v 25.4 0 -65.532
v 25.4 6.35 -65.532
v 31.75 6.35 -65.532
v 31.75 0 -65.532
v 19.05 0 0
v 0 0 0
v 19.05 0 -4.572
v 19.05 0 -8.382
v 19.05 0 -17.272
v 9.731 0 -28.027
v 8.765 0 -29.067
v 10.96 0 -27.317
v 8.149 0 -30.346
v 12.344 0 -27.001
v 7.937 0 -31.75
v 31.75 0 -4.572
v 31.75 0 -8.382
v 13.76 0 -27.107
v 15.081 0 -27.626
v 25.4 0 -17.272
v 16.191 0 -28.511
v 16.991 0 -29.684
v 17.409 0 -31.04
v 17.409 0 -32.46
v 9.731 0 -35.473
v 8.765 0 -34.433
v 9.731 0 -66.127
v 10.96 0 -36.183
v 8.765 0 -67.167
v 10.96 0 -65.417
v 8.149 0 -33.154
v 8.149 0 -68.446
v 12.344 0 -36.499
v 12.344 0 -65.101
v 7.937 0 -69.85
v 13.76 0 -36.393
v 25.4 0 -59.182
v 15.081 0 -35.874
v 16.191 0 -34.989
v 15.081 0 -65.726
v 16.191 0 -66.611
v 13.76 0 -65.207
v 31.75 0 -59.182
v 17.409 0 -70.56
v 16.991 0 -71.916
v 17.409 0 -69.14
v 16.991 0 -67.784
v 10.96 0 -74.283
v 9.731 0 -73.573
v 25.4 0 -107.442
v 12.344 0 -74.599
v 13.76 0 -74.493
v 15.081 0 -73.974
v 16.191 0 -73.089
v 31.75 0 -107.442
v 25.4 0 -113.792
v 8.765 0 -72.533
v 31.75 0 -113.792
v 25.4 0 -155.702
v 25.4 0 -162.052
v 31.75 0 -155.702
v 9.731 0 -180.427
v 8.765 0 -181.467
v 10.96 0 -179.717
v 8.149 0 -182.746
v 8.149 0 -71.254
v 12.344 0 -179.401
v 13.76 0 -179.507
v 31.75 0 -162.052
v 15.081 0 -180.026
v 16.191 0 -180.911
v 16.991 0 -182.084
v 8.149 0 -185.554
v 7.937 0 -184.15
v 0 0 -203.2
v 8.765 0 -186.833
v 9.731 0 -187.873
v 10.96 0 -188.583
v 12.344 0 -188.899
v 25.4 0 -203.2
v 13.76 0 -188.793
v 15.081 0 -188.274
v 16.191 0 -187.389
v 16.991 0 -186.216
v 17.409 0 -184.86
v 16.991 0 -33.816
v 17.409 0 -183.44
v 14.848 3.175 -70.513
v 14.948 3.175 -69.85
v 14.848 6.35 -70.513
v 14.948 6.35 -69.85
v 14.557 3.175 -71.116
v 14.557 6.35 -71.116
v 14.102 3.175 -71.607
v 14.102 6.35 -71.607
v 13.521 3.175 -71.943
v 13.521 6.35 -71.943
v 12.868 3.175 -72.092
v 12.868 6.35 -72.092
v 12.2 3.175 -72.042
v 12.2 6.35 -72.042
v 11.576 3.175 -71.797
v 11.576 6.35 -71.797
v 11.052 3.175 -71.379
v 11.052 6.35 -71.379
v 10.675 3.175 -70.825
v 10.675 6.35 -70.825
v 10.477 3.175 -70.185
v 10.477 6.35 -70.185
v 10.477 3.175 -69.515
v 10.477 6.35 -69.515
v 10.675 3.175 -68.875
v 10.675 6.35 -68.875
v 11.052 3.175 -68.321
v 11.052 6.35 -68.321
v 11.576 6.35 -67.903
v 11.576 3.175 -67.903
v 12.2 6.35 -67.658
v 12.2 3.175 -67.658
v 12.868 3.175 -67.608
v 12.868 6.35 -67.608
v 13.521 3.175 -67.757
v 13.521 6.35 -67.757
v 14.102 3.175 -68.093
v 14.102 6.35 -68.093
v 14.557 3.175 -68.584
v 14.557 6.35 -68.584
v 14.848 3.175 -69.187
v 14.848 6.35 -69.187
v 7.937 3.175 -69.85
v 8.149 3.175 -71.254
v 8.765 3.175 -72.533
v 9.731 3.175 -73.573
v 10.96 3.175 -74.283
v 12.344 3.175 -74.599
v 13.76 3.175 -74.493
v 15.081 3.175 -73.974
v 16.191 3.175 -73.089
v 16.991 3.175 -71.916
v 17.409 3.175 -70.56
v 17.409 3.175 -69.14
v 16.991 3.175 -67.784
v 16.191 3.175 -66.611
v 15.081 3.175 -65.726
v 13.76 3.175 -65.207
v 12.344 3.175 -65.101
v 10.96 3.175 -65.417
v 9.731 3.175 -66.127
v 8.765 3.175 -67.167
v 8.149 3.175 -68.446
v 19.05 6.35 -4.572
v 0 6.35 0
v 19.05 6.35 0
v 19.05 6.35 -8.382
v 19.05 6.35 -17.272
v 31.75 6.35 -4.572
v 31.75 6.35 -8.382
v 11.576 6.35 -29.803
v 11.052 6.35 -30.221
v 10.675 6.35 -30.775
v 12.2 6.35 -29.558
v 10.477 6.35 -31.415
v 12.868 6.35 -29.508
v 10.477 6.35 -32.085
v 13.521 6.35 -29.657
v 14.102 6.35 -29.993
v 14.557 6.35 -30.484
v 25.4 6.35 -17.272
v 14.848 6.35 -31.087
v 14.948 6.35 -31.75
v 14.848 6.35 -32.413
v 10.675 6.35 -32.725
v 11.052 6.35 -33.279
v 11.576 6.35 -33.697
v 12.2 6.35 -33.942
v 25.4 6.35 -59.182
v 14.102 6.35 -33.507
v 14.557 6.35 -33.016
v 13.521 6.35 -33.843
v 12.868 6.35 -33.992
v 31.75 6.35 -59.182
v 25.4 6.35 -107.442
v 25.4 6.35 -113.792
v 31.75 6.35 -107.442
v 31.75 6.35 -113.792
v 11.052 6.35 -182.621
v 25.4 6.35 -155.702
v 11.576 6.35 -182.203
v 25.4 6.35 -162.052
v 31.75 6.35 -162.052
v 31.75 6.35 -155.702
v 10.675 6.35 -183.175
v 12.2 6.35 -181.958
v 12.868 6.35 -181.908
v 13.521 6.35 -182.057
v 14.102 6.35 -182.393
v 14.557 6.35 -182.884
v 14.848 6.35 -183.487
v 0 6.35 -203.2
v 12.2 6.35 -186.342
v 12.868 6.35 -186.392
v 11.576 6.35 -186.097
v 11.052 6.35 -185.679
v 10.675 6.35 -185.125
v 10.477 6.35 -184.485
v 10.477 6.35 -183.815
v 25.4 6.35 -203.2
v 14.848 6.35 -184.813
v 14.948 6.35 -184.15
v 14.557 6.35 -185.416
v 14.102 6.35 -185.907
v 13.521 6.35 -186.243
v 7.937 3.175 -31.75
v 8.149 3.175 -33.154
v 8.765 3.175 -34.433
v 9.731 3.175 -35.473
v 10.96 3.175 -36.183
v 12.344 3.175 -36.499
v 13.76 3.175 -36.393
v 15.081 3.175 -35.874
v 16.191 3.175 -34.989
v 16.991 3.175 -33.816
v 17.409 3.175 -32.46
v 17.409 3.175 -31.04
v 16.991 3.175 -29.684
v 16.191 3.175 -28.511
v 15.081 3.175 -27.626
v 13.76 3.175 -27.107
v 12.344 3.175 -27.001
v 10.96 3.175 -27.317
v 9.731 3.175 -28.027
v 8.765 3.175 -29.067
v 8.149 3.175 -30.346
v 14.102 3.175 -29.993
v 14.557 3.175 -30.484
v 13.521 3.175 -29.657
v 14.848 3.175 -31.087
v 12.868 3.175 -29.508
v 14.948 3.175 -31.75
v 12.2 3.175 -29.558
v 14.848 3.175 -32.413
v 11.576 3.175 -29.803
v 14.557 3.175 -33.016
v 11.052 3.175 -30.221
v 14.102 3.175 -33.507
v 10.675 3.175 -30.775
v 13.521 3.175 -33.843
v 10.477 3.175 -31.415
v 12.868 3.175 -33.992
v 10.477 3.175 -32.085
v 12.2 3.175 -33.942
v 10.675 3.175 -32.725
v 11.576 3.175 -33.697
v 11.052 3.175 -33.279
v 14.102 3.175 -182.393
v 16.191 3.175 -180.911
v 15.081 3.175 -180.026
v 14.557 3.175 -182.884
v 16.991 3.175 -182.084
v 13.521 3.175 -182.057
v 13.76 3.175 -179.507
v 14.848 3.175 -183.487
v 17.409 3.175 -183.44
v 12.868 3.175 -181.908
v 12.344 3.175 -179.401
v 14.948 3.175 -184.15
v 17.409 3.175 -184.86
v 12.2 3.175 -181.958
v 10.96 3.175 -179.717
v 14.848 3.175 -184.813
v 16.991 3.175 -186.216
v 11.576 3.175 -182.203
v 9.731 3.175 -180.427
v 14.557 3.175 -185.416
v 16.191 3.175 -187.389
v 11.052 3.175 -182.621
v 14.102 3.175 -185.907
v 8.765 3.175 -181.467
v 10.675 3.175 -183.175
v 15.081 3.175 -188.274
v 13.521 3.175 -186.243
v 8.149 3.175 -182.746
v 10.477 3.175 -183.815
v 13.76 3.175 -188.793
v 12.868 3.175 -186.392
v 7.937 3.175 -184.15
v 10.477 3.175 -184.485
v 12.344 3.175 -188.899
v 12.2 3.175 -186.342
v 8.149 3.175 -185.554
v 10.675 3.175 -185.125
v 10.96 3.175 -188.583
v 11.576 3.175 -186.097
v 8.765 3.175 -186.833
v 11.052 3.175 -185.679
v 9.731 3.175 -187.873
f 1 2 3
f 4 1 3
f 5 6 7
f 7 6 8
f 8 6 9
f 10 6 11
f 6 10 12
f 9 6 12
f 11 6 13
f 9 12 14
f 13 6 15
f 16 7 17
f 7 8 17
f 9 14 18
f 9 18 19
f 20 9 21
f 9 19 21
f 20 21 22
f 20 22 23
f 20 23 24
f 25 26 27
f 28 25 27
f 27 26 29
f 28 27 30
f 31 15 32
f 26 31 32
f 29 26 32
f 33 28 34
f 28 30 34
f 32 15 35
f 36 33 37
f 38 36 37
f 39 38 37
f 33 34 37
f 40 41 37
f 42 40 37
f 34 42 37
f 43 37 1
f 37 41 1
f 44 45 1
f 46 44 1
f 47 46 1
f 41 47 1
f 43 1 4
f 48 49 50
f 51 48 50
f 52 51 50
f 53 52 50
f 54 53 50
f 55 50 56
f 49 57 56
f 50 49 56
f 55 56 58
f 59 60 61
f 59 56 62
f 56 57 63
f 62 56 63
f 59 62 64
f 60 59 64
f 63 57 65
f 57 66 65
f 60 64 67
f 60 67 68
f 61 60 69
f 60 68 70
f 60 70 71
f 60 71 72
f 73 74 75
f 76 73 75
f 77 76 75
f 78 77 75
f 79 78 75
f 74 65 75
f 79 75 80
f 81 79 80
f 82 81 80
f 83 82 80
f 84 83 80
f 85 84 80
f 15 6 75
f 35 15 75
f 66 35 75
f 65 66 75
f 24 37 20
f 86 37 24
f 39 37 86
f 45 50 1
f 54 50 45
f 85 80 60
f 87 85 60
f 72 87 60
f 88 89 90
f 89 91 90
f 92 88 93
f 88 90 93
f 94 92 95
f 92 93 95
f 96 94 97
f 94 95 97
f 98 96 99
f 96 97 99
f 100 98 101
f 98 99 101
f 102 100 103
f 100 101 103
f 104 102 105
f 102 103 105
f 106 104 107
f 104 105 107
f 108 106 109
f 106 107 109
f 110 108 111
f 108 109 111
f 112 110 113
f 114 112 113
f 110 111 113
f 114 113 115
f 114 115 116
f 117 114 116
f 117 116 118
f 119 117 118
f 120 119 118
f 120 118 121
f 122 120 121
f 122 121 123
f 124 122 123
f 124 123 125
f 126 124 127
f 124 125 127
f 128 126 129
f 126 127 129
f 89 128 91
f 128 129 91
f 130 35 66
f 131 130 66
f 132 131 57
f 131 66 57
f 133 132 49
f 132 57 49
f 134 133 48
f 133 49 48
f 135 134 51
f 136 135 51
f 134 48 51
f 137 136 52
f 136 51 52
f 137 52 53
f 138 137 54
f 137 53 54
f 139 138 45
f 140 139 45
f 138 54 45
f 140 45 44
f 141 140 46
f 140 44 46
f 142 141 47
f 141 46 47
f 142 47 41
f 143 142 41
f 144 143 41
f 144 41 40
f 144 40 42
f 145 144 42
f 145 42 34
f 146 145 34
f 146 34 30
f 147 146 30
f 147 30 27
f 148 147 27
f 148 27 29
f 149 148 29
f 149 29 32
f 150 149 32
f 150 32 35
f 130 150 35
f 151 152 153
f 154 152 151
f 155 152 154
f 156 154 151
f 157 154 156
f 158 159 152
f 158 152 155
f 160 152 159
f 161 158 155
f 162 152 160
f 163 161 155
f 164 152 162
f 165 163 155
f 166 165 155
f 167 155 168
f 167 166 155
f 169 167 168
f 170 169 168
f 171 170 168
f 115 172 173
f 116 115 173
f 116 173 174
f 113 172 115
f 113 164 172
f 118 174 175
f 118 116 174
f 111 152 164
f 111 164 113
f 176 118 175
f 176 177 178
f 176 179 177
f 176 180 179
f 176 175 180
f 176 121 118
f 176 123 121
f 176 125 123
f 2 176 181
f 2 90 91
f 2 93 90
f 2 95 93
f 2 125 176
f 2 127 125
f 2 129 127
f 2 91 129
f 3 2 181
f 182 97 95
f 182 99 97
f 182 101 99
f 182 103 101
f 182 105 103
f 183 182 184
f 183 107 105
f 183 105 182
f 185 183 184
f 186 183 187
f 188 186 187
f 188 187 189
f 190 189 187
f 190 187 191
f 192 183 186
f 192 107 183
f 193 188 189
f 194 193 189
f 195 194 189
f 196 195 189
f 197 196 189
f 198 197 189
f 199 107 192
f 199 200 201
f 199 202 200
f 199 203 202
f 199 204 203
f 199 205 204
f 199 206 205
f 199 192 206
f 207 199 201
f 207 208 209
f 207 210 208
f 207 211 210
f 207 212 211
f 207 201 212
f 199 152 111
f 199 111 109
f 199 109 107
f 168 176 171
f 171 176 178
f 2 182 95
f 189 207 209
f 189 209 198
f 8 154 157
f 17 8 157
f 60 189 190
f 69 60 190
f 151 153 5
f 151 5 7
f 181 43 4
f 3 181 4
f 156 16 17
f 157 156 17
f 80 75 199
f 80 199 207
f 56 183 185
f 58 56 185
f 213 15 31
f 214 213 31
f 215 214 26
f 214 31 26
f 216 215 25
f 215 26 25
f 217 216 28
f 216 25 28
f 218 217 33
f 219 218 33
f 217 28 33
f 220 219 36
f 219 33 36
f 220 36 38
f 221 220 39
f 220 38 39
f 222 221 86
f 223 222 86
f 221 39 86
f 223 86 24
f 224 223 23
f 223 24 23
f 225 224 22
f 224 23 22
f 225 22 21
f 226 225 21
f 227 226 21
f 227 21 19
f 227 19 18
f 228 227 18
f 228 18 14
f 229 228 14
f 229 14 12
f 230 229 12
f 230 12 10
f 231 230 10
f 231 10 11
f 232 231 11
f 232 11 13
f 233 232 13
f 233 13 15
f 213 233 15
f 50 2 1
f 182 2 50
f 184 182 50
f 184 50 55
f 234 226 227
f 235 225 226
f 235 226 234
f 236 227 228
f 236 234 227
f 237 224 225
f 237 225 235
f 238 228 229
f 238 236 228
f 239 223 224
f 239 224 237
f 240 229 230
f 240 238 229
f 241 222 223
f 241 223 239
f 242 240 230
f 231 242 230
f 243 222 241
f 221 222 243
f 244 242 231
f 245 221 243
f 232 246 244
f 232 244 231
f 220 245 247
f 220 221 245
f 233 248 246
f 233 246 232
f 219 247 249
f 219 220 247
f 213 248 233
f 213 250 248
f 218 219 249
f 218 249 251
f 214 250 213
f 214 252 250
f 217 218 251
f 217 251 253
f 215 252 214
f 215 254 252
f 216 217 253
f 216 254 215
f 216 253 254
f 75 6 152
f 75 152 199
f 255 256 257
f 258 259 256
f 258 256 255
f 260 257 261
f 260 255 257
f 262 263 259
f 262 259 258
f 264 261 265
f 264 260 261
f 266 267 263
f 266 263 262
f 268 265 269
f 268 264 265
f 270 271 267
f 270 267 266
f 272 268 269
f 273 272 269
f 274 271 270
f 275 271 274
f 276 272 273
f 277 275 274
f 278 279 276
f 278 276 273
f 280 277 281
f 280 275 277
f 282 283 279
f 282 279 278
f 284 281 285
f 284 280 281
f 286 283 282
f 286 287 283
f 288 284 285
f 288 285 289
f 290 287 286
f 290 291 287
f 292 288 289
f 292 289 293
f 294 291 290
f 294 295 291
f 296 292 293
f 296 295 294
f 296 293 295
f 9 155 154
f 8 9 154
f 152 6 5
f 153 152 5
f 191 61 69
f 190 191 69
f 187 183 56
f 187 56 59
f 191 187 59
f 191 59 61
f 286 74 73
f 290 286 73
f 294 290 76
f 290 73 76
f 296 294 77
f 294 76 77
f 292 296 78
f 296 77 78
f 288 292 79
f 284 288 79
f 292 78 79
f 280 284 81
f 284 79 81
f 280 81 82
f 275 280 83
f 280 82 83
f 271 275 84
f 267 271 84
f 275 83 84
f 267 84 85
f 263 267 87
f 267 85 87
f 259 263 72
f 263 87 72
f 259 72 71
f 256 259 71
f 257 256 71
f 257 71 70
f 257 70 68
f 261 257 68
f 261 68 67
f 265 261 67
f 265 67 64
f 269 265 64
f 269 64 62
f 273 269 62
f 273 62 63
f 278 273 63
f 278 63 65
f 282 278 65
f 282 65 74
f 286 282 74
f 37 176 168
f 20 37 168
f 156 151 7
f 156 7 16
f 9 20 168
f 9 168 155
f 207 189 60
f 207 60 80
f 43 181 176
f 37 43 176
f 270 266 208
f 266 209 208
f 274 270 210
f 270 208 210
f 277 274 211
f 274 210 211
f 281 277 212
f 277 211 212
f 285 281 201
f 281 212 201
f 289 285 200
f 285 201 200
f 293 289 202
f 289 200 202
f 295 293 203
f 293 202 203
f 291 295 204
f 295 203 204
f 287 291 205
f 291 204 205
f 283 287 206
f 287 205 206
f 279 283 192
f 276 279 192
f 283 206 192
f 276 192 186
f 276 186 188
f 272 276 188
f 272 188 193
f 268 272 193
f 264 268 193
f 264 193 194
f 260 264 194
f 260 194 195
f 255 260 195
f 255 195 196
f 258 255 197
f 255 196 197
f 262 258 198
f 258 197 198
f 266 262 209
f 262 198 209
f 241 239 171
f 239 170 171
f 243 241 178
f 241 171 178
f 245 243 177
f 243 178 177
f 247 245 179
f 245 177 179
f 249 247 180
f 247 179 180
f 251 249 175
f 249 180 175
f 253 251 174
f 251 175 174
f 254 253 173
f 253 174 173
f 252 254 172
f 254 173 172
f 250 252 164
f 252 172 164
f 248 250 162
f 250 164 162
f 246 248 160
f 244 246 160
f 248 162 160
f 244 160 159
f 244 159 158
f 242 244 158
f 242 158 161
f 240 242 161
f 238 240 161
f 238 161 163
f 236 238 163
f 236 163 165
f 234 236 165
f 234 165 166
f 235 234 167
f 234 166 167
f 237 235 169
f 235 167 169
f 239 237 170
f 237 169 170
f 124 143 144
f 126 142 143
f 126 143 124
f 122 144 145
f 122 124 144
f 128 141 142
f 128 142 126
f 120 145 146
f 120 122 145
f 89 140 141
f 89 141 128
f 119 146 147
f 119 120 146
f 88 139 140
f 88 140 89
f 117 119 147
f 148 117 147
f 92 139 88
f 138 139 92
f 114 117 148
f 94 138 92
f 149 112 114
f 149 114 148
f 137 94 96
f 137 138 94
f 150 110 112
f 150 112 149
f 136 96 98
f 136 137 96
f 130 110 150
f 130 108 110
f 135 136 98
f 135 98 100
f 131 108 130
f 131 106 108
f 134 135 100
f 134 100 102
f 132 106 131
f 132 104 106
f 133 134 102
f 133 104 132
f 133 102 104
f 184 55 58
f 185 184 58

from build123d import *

# Parameters (mm, degrees)
SKETCH1_W                                           = 31.75
SKETCH1_H                                           = 203.2
BOSS_EXTRUDE1_DEPTH                                 = 6.35
SKETCH2_W                                           = 6.35
SKETCH2_H                                           = 41.148
SKETCH2_H_2                                         = 41.91
SKETCH2_W_2                                         = 12.7
SKETCH2_H_3                                         = 4.572
CUT_EXTRUDE1_DEPTH                                  = 7.35
CBORE_FOR_8_BINDING_HEAD_MACHINE_SCREW1_D           = 4.4958
CBORE_FOR_8_BINDING_HEAD_MACHINE_SCREW1_CBORE_D     = 9.525
CBORE_FOR_8_BINDING_HEAD_MACHINE_SCREW1_CBORE_DEPTH = 3.175


with BuildPart() as part:
    # Sketch1 → Boss-Extrude1 (new body)
    with BuildSketch(Plane(origin=(0, 0, 0), x_dir=(1, 0, 0), z_dir=(0, 1, 0))):
        with Locations((15.875, 101.6)):
            Rectangle(SKETCH1_W, SKETCH1_H)
    extrude(amount=BOSS_EXTRUDE1_DEPTH)

    # Sketch2 → Cut-Extrude1 (cut, through all)
    with BuildSketch(Plane(origin=(0, 6.35, 0), x_dir=(1, 0, 0), z_dir=(0, 1, 0))):
        with Locations((28.575, 182.626)):
            Rectangle(SKETCH2_W, SKETCH2_H)
        with Locations((28.575, 134.747)):
            Rectangle(SKETCH2_W, SKETCH2_H_2)
        Polygon((31.75, 59.182), (25.4, 59.182), (25.4, 17.272), (19.05, 17.272), (19.05, 8.382), (31.75, 8.382), align=None)
        with Locations((28.575, 86.487)):
            Rectangle(SKETCH2_W, SKETCH2_H_2)
        with Locations((25.4, 2.286)):
            Rectangle(SKETCH2_W_2, SKETCH2_H_3)
    extrude(amount=-CUT_EXTRUDE1_DEPTH, mode=Mode.SUBTRACT)

    # CBORE for #8 Binding Head Machine Screw1 (through all)
    with Locations(Plane(origin=(0, 0, 0), x_dir=(-1, 0, 0), z_dir=(0, -1, 0))):
        with Locations((-12.7, 31.75), (-12.7, 69.85), (-12.7, 184.15)):
            CounterBoreHole(CBORE_FOR_8_BINDING_HEAD_MACHINE_SCREW1_D / 2, CBORE_FOR_8_BINDING_HEAD_MACHINE_SCREW1_CBORE_D / 2, CBORE_FOR_8_BINDING_HEAD_MACHINE_SCREW1_CBORE_DEPTH)


solid = part.part
